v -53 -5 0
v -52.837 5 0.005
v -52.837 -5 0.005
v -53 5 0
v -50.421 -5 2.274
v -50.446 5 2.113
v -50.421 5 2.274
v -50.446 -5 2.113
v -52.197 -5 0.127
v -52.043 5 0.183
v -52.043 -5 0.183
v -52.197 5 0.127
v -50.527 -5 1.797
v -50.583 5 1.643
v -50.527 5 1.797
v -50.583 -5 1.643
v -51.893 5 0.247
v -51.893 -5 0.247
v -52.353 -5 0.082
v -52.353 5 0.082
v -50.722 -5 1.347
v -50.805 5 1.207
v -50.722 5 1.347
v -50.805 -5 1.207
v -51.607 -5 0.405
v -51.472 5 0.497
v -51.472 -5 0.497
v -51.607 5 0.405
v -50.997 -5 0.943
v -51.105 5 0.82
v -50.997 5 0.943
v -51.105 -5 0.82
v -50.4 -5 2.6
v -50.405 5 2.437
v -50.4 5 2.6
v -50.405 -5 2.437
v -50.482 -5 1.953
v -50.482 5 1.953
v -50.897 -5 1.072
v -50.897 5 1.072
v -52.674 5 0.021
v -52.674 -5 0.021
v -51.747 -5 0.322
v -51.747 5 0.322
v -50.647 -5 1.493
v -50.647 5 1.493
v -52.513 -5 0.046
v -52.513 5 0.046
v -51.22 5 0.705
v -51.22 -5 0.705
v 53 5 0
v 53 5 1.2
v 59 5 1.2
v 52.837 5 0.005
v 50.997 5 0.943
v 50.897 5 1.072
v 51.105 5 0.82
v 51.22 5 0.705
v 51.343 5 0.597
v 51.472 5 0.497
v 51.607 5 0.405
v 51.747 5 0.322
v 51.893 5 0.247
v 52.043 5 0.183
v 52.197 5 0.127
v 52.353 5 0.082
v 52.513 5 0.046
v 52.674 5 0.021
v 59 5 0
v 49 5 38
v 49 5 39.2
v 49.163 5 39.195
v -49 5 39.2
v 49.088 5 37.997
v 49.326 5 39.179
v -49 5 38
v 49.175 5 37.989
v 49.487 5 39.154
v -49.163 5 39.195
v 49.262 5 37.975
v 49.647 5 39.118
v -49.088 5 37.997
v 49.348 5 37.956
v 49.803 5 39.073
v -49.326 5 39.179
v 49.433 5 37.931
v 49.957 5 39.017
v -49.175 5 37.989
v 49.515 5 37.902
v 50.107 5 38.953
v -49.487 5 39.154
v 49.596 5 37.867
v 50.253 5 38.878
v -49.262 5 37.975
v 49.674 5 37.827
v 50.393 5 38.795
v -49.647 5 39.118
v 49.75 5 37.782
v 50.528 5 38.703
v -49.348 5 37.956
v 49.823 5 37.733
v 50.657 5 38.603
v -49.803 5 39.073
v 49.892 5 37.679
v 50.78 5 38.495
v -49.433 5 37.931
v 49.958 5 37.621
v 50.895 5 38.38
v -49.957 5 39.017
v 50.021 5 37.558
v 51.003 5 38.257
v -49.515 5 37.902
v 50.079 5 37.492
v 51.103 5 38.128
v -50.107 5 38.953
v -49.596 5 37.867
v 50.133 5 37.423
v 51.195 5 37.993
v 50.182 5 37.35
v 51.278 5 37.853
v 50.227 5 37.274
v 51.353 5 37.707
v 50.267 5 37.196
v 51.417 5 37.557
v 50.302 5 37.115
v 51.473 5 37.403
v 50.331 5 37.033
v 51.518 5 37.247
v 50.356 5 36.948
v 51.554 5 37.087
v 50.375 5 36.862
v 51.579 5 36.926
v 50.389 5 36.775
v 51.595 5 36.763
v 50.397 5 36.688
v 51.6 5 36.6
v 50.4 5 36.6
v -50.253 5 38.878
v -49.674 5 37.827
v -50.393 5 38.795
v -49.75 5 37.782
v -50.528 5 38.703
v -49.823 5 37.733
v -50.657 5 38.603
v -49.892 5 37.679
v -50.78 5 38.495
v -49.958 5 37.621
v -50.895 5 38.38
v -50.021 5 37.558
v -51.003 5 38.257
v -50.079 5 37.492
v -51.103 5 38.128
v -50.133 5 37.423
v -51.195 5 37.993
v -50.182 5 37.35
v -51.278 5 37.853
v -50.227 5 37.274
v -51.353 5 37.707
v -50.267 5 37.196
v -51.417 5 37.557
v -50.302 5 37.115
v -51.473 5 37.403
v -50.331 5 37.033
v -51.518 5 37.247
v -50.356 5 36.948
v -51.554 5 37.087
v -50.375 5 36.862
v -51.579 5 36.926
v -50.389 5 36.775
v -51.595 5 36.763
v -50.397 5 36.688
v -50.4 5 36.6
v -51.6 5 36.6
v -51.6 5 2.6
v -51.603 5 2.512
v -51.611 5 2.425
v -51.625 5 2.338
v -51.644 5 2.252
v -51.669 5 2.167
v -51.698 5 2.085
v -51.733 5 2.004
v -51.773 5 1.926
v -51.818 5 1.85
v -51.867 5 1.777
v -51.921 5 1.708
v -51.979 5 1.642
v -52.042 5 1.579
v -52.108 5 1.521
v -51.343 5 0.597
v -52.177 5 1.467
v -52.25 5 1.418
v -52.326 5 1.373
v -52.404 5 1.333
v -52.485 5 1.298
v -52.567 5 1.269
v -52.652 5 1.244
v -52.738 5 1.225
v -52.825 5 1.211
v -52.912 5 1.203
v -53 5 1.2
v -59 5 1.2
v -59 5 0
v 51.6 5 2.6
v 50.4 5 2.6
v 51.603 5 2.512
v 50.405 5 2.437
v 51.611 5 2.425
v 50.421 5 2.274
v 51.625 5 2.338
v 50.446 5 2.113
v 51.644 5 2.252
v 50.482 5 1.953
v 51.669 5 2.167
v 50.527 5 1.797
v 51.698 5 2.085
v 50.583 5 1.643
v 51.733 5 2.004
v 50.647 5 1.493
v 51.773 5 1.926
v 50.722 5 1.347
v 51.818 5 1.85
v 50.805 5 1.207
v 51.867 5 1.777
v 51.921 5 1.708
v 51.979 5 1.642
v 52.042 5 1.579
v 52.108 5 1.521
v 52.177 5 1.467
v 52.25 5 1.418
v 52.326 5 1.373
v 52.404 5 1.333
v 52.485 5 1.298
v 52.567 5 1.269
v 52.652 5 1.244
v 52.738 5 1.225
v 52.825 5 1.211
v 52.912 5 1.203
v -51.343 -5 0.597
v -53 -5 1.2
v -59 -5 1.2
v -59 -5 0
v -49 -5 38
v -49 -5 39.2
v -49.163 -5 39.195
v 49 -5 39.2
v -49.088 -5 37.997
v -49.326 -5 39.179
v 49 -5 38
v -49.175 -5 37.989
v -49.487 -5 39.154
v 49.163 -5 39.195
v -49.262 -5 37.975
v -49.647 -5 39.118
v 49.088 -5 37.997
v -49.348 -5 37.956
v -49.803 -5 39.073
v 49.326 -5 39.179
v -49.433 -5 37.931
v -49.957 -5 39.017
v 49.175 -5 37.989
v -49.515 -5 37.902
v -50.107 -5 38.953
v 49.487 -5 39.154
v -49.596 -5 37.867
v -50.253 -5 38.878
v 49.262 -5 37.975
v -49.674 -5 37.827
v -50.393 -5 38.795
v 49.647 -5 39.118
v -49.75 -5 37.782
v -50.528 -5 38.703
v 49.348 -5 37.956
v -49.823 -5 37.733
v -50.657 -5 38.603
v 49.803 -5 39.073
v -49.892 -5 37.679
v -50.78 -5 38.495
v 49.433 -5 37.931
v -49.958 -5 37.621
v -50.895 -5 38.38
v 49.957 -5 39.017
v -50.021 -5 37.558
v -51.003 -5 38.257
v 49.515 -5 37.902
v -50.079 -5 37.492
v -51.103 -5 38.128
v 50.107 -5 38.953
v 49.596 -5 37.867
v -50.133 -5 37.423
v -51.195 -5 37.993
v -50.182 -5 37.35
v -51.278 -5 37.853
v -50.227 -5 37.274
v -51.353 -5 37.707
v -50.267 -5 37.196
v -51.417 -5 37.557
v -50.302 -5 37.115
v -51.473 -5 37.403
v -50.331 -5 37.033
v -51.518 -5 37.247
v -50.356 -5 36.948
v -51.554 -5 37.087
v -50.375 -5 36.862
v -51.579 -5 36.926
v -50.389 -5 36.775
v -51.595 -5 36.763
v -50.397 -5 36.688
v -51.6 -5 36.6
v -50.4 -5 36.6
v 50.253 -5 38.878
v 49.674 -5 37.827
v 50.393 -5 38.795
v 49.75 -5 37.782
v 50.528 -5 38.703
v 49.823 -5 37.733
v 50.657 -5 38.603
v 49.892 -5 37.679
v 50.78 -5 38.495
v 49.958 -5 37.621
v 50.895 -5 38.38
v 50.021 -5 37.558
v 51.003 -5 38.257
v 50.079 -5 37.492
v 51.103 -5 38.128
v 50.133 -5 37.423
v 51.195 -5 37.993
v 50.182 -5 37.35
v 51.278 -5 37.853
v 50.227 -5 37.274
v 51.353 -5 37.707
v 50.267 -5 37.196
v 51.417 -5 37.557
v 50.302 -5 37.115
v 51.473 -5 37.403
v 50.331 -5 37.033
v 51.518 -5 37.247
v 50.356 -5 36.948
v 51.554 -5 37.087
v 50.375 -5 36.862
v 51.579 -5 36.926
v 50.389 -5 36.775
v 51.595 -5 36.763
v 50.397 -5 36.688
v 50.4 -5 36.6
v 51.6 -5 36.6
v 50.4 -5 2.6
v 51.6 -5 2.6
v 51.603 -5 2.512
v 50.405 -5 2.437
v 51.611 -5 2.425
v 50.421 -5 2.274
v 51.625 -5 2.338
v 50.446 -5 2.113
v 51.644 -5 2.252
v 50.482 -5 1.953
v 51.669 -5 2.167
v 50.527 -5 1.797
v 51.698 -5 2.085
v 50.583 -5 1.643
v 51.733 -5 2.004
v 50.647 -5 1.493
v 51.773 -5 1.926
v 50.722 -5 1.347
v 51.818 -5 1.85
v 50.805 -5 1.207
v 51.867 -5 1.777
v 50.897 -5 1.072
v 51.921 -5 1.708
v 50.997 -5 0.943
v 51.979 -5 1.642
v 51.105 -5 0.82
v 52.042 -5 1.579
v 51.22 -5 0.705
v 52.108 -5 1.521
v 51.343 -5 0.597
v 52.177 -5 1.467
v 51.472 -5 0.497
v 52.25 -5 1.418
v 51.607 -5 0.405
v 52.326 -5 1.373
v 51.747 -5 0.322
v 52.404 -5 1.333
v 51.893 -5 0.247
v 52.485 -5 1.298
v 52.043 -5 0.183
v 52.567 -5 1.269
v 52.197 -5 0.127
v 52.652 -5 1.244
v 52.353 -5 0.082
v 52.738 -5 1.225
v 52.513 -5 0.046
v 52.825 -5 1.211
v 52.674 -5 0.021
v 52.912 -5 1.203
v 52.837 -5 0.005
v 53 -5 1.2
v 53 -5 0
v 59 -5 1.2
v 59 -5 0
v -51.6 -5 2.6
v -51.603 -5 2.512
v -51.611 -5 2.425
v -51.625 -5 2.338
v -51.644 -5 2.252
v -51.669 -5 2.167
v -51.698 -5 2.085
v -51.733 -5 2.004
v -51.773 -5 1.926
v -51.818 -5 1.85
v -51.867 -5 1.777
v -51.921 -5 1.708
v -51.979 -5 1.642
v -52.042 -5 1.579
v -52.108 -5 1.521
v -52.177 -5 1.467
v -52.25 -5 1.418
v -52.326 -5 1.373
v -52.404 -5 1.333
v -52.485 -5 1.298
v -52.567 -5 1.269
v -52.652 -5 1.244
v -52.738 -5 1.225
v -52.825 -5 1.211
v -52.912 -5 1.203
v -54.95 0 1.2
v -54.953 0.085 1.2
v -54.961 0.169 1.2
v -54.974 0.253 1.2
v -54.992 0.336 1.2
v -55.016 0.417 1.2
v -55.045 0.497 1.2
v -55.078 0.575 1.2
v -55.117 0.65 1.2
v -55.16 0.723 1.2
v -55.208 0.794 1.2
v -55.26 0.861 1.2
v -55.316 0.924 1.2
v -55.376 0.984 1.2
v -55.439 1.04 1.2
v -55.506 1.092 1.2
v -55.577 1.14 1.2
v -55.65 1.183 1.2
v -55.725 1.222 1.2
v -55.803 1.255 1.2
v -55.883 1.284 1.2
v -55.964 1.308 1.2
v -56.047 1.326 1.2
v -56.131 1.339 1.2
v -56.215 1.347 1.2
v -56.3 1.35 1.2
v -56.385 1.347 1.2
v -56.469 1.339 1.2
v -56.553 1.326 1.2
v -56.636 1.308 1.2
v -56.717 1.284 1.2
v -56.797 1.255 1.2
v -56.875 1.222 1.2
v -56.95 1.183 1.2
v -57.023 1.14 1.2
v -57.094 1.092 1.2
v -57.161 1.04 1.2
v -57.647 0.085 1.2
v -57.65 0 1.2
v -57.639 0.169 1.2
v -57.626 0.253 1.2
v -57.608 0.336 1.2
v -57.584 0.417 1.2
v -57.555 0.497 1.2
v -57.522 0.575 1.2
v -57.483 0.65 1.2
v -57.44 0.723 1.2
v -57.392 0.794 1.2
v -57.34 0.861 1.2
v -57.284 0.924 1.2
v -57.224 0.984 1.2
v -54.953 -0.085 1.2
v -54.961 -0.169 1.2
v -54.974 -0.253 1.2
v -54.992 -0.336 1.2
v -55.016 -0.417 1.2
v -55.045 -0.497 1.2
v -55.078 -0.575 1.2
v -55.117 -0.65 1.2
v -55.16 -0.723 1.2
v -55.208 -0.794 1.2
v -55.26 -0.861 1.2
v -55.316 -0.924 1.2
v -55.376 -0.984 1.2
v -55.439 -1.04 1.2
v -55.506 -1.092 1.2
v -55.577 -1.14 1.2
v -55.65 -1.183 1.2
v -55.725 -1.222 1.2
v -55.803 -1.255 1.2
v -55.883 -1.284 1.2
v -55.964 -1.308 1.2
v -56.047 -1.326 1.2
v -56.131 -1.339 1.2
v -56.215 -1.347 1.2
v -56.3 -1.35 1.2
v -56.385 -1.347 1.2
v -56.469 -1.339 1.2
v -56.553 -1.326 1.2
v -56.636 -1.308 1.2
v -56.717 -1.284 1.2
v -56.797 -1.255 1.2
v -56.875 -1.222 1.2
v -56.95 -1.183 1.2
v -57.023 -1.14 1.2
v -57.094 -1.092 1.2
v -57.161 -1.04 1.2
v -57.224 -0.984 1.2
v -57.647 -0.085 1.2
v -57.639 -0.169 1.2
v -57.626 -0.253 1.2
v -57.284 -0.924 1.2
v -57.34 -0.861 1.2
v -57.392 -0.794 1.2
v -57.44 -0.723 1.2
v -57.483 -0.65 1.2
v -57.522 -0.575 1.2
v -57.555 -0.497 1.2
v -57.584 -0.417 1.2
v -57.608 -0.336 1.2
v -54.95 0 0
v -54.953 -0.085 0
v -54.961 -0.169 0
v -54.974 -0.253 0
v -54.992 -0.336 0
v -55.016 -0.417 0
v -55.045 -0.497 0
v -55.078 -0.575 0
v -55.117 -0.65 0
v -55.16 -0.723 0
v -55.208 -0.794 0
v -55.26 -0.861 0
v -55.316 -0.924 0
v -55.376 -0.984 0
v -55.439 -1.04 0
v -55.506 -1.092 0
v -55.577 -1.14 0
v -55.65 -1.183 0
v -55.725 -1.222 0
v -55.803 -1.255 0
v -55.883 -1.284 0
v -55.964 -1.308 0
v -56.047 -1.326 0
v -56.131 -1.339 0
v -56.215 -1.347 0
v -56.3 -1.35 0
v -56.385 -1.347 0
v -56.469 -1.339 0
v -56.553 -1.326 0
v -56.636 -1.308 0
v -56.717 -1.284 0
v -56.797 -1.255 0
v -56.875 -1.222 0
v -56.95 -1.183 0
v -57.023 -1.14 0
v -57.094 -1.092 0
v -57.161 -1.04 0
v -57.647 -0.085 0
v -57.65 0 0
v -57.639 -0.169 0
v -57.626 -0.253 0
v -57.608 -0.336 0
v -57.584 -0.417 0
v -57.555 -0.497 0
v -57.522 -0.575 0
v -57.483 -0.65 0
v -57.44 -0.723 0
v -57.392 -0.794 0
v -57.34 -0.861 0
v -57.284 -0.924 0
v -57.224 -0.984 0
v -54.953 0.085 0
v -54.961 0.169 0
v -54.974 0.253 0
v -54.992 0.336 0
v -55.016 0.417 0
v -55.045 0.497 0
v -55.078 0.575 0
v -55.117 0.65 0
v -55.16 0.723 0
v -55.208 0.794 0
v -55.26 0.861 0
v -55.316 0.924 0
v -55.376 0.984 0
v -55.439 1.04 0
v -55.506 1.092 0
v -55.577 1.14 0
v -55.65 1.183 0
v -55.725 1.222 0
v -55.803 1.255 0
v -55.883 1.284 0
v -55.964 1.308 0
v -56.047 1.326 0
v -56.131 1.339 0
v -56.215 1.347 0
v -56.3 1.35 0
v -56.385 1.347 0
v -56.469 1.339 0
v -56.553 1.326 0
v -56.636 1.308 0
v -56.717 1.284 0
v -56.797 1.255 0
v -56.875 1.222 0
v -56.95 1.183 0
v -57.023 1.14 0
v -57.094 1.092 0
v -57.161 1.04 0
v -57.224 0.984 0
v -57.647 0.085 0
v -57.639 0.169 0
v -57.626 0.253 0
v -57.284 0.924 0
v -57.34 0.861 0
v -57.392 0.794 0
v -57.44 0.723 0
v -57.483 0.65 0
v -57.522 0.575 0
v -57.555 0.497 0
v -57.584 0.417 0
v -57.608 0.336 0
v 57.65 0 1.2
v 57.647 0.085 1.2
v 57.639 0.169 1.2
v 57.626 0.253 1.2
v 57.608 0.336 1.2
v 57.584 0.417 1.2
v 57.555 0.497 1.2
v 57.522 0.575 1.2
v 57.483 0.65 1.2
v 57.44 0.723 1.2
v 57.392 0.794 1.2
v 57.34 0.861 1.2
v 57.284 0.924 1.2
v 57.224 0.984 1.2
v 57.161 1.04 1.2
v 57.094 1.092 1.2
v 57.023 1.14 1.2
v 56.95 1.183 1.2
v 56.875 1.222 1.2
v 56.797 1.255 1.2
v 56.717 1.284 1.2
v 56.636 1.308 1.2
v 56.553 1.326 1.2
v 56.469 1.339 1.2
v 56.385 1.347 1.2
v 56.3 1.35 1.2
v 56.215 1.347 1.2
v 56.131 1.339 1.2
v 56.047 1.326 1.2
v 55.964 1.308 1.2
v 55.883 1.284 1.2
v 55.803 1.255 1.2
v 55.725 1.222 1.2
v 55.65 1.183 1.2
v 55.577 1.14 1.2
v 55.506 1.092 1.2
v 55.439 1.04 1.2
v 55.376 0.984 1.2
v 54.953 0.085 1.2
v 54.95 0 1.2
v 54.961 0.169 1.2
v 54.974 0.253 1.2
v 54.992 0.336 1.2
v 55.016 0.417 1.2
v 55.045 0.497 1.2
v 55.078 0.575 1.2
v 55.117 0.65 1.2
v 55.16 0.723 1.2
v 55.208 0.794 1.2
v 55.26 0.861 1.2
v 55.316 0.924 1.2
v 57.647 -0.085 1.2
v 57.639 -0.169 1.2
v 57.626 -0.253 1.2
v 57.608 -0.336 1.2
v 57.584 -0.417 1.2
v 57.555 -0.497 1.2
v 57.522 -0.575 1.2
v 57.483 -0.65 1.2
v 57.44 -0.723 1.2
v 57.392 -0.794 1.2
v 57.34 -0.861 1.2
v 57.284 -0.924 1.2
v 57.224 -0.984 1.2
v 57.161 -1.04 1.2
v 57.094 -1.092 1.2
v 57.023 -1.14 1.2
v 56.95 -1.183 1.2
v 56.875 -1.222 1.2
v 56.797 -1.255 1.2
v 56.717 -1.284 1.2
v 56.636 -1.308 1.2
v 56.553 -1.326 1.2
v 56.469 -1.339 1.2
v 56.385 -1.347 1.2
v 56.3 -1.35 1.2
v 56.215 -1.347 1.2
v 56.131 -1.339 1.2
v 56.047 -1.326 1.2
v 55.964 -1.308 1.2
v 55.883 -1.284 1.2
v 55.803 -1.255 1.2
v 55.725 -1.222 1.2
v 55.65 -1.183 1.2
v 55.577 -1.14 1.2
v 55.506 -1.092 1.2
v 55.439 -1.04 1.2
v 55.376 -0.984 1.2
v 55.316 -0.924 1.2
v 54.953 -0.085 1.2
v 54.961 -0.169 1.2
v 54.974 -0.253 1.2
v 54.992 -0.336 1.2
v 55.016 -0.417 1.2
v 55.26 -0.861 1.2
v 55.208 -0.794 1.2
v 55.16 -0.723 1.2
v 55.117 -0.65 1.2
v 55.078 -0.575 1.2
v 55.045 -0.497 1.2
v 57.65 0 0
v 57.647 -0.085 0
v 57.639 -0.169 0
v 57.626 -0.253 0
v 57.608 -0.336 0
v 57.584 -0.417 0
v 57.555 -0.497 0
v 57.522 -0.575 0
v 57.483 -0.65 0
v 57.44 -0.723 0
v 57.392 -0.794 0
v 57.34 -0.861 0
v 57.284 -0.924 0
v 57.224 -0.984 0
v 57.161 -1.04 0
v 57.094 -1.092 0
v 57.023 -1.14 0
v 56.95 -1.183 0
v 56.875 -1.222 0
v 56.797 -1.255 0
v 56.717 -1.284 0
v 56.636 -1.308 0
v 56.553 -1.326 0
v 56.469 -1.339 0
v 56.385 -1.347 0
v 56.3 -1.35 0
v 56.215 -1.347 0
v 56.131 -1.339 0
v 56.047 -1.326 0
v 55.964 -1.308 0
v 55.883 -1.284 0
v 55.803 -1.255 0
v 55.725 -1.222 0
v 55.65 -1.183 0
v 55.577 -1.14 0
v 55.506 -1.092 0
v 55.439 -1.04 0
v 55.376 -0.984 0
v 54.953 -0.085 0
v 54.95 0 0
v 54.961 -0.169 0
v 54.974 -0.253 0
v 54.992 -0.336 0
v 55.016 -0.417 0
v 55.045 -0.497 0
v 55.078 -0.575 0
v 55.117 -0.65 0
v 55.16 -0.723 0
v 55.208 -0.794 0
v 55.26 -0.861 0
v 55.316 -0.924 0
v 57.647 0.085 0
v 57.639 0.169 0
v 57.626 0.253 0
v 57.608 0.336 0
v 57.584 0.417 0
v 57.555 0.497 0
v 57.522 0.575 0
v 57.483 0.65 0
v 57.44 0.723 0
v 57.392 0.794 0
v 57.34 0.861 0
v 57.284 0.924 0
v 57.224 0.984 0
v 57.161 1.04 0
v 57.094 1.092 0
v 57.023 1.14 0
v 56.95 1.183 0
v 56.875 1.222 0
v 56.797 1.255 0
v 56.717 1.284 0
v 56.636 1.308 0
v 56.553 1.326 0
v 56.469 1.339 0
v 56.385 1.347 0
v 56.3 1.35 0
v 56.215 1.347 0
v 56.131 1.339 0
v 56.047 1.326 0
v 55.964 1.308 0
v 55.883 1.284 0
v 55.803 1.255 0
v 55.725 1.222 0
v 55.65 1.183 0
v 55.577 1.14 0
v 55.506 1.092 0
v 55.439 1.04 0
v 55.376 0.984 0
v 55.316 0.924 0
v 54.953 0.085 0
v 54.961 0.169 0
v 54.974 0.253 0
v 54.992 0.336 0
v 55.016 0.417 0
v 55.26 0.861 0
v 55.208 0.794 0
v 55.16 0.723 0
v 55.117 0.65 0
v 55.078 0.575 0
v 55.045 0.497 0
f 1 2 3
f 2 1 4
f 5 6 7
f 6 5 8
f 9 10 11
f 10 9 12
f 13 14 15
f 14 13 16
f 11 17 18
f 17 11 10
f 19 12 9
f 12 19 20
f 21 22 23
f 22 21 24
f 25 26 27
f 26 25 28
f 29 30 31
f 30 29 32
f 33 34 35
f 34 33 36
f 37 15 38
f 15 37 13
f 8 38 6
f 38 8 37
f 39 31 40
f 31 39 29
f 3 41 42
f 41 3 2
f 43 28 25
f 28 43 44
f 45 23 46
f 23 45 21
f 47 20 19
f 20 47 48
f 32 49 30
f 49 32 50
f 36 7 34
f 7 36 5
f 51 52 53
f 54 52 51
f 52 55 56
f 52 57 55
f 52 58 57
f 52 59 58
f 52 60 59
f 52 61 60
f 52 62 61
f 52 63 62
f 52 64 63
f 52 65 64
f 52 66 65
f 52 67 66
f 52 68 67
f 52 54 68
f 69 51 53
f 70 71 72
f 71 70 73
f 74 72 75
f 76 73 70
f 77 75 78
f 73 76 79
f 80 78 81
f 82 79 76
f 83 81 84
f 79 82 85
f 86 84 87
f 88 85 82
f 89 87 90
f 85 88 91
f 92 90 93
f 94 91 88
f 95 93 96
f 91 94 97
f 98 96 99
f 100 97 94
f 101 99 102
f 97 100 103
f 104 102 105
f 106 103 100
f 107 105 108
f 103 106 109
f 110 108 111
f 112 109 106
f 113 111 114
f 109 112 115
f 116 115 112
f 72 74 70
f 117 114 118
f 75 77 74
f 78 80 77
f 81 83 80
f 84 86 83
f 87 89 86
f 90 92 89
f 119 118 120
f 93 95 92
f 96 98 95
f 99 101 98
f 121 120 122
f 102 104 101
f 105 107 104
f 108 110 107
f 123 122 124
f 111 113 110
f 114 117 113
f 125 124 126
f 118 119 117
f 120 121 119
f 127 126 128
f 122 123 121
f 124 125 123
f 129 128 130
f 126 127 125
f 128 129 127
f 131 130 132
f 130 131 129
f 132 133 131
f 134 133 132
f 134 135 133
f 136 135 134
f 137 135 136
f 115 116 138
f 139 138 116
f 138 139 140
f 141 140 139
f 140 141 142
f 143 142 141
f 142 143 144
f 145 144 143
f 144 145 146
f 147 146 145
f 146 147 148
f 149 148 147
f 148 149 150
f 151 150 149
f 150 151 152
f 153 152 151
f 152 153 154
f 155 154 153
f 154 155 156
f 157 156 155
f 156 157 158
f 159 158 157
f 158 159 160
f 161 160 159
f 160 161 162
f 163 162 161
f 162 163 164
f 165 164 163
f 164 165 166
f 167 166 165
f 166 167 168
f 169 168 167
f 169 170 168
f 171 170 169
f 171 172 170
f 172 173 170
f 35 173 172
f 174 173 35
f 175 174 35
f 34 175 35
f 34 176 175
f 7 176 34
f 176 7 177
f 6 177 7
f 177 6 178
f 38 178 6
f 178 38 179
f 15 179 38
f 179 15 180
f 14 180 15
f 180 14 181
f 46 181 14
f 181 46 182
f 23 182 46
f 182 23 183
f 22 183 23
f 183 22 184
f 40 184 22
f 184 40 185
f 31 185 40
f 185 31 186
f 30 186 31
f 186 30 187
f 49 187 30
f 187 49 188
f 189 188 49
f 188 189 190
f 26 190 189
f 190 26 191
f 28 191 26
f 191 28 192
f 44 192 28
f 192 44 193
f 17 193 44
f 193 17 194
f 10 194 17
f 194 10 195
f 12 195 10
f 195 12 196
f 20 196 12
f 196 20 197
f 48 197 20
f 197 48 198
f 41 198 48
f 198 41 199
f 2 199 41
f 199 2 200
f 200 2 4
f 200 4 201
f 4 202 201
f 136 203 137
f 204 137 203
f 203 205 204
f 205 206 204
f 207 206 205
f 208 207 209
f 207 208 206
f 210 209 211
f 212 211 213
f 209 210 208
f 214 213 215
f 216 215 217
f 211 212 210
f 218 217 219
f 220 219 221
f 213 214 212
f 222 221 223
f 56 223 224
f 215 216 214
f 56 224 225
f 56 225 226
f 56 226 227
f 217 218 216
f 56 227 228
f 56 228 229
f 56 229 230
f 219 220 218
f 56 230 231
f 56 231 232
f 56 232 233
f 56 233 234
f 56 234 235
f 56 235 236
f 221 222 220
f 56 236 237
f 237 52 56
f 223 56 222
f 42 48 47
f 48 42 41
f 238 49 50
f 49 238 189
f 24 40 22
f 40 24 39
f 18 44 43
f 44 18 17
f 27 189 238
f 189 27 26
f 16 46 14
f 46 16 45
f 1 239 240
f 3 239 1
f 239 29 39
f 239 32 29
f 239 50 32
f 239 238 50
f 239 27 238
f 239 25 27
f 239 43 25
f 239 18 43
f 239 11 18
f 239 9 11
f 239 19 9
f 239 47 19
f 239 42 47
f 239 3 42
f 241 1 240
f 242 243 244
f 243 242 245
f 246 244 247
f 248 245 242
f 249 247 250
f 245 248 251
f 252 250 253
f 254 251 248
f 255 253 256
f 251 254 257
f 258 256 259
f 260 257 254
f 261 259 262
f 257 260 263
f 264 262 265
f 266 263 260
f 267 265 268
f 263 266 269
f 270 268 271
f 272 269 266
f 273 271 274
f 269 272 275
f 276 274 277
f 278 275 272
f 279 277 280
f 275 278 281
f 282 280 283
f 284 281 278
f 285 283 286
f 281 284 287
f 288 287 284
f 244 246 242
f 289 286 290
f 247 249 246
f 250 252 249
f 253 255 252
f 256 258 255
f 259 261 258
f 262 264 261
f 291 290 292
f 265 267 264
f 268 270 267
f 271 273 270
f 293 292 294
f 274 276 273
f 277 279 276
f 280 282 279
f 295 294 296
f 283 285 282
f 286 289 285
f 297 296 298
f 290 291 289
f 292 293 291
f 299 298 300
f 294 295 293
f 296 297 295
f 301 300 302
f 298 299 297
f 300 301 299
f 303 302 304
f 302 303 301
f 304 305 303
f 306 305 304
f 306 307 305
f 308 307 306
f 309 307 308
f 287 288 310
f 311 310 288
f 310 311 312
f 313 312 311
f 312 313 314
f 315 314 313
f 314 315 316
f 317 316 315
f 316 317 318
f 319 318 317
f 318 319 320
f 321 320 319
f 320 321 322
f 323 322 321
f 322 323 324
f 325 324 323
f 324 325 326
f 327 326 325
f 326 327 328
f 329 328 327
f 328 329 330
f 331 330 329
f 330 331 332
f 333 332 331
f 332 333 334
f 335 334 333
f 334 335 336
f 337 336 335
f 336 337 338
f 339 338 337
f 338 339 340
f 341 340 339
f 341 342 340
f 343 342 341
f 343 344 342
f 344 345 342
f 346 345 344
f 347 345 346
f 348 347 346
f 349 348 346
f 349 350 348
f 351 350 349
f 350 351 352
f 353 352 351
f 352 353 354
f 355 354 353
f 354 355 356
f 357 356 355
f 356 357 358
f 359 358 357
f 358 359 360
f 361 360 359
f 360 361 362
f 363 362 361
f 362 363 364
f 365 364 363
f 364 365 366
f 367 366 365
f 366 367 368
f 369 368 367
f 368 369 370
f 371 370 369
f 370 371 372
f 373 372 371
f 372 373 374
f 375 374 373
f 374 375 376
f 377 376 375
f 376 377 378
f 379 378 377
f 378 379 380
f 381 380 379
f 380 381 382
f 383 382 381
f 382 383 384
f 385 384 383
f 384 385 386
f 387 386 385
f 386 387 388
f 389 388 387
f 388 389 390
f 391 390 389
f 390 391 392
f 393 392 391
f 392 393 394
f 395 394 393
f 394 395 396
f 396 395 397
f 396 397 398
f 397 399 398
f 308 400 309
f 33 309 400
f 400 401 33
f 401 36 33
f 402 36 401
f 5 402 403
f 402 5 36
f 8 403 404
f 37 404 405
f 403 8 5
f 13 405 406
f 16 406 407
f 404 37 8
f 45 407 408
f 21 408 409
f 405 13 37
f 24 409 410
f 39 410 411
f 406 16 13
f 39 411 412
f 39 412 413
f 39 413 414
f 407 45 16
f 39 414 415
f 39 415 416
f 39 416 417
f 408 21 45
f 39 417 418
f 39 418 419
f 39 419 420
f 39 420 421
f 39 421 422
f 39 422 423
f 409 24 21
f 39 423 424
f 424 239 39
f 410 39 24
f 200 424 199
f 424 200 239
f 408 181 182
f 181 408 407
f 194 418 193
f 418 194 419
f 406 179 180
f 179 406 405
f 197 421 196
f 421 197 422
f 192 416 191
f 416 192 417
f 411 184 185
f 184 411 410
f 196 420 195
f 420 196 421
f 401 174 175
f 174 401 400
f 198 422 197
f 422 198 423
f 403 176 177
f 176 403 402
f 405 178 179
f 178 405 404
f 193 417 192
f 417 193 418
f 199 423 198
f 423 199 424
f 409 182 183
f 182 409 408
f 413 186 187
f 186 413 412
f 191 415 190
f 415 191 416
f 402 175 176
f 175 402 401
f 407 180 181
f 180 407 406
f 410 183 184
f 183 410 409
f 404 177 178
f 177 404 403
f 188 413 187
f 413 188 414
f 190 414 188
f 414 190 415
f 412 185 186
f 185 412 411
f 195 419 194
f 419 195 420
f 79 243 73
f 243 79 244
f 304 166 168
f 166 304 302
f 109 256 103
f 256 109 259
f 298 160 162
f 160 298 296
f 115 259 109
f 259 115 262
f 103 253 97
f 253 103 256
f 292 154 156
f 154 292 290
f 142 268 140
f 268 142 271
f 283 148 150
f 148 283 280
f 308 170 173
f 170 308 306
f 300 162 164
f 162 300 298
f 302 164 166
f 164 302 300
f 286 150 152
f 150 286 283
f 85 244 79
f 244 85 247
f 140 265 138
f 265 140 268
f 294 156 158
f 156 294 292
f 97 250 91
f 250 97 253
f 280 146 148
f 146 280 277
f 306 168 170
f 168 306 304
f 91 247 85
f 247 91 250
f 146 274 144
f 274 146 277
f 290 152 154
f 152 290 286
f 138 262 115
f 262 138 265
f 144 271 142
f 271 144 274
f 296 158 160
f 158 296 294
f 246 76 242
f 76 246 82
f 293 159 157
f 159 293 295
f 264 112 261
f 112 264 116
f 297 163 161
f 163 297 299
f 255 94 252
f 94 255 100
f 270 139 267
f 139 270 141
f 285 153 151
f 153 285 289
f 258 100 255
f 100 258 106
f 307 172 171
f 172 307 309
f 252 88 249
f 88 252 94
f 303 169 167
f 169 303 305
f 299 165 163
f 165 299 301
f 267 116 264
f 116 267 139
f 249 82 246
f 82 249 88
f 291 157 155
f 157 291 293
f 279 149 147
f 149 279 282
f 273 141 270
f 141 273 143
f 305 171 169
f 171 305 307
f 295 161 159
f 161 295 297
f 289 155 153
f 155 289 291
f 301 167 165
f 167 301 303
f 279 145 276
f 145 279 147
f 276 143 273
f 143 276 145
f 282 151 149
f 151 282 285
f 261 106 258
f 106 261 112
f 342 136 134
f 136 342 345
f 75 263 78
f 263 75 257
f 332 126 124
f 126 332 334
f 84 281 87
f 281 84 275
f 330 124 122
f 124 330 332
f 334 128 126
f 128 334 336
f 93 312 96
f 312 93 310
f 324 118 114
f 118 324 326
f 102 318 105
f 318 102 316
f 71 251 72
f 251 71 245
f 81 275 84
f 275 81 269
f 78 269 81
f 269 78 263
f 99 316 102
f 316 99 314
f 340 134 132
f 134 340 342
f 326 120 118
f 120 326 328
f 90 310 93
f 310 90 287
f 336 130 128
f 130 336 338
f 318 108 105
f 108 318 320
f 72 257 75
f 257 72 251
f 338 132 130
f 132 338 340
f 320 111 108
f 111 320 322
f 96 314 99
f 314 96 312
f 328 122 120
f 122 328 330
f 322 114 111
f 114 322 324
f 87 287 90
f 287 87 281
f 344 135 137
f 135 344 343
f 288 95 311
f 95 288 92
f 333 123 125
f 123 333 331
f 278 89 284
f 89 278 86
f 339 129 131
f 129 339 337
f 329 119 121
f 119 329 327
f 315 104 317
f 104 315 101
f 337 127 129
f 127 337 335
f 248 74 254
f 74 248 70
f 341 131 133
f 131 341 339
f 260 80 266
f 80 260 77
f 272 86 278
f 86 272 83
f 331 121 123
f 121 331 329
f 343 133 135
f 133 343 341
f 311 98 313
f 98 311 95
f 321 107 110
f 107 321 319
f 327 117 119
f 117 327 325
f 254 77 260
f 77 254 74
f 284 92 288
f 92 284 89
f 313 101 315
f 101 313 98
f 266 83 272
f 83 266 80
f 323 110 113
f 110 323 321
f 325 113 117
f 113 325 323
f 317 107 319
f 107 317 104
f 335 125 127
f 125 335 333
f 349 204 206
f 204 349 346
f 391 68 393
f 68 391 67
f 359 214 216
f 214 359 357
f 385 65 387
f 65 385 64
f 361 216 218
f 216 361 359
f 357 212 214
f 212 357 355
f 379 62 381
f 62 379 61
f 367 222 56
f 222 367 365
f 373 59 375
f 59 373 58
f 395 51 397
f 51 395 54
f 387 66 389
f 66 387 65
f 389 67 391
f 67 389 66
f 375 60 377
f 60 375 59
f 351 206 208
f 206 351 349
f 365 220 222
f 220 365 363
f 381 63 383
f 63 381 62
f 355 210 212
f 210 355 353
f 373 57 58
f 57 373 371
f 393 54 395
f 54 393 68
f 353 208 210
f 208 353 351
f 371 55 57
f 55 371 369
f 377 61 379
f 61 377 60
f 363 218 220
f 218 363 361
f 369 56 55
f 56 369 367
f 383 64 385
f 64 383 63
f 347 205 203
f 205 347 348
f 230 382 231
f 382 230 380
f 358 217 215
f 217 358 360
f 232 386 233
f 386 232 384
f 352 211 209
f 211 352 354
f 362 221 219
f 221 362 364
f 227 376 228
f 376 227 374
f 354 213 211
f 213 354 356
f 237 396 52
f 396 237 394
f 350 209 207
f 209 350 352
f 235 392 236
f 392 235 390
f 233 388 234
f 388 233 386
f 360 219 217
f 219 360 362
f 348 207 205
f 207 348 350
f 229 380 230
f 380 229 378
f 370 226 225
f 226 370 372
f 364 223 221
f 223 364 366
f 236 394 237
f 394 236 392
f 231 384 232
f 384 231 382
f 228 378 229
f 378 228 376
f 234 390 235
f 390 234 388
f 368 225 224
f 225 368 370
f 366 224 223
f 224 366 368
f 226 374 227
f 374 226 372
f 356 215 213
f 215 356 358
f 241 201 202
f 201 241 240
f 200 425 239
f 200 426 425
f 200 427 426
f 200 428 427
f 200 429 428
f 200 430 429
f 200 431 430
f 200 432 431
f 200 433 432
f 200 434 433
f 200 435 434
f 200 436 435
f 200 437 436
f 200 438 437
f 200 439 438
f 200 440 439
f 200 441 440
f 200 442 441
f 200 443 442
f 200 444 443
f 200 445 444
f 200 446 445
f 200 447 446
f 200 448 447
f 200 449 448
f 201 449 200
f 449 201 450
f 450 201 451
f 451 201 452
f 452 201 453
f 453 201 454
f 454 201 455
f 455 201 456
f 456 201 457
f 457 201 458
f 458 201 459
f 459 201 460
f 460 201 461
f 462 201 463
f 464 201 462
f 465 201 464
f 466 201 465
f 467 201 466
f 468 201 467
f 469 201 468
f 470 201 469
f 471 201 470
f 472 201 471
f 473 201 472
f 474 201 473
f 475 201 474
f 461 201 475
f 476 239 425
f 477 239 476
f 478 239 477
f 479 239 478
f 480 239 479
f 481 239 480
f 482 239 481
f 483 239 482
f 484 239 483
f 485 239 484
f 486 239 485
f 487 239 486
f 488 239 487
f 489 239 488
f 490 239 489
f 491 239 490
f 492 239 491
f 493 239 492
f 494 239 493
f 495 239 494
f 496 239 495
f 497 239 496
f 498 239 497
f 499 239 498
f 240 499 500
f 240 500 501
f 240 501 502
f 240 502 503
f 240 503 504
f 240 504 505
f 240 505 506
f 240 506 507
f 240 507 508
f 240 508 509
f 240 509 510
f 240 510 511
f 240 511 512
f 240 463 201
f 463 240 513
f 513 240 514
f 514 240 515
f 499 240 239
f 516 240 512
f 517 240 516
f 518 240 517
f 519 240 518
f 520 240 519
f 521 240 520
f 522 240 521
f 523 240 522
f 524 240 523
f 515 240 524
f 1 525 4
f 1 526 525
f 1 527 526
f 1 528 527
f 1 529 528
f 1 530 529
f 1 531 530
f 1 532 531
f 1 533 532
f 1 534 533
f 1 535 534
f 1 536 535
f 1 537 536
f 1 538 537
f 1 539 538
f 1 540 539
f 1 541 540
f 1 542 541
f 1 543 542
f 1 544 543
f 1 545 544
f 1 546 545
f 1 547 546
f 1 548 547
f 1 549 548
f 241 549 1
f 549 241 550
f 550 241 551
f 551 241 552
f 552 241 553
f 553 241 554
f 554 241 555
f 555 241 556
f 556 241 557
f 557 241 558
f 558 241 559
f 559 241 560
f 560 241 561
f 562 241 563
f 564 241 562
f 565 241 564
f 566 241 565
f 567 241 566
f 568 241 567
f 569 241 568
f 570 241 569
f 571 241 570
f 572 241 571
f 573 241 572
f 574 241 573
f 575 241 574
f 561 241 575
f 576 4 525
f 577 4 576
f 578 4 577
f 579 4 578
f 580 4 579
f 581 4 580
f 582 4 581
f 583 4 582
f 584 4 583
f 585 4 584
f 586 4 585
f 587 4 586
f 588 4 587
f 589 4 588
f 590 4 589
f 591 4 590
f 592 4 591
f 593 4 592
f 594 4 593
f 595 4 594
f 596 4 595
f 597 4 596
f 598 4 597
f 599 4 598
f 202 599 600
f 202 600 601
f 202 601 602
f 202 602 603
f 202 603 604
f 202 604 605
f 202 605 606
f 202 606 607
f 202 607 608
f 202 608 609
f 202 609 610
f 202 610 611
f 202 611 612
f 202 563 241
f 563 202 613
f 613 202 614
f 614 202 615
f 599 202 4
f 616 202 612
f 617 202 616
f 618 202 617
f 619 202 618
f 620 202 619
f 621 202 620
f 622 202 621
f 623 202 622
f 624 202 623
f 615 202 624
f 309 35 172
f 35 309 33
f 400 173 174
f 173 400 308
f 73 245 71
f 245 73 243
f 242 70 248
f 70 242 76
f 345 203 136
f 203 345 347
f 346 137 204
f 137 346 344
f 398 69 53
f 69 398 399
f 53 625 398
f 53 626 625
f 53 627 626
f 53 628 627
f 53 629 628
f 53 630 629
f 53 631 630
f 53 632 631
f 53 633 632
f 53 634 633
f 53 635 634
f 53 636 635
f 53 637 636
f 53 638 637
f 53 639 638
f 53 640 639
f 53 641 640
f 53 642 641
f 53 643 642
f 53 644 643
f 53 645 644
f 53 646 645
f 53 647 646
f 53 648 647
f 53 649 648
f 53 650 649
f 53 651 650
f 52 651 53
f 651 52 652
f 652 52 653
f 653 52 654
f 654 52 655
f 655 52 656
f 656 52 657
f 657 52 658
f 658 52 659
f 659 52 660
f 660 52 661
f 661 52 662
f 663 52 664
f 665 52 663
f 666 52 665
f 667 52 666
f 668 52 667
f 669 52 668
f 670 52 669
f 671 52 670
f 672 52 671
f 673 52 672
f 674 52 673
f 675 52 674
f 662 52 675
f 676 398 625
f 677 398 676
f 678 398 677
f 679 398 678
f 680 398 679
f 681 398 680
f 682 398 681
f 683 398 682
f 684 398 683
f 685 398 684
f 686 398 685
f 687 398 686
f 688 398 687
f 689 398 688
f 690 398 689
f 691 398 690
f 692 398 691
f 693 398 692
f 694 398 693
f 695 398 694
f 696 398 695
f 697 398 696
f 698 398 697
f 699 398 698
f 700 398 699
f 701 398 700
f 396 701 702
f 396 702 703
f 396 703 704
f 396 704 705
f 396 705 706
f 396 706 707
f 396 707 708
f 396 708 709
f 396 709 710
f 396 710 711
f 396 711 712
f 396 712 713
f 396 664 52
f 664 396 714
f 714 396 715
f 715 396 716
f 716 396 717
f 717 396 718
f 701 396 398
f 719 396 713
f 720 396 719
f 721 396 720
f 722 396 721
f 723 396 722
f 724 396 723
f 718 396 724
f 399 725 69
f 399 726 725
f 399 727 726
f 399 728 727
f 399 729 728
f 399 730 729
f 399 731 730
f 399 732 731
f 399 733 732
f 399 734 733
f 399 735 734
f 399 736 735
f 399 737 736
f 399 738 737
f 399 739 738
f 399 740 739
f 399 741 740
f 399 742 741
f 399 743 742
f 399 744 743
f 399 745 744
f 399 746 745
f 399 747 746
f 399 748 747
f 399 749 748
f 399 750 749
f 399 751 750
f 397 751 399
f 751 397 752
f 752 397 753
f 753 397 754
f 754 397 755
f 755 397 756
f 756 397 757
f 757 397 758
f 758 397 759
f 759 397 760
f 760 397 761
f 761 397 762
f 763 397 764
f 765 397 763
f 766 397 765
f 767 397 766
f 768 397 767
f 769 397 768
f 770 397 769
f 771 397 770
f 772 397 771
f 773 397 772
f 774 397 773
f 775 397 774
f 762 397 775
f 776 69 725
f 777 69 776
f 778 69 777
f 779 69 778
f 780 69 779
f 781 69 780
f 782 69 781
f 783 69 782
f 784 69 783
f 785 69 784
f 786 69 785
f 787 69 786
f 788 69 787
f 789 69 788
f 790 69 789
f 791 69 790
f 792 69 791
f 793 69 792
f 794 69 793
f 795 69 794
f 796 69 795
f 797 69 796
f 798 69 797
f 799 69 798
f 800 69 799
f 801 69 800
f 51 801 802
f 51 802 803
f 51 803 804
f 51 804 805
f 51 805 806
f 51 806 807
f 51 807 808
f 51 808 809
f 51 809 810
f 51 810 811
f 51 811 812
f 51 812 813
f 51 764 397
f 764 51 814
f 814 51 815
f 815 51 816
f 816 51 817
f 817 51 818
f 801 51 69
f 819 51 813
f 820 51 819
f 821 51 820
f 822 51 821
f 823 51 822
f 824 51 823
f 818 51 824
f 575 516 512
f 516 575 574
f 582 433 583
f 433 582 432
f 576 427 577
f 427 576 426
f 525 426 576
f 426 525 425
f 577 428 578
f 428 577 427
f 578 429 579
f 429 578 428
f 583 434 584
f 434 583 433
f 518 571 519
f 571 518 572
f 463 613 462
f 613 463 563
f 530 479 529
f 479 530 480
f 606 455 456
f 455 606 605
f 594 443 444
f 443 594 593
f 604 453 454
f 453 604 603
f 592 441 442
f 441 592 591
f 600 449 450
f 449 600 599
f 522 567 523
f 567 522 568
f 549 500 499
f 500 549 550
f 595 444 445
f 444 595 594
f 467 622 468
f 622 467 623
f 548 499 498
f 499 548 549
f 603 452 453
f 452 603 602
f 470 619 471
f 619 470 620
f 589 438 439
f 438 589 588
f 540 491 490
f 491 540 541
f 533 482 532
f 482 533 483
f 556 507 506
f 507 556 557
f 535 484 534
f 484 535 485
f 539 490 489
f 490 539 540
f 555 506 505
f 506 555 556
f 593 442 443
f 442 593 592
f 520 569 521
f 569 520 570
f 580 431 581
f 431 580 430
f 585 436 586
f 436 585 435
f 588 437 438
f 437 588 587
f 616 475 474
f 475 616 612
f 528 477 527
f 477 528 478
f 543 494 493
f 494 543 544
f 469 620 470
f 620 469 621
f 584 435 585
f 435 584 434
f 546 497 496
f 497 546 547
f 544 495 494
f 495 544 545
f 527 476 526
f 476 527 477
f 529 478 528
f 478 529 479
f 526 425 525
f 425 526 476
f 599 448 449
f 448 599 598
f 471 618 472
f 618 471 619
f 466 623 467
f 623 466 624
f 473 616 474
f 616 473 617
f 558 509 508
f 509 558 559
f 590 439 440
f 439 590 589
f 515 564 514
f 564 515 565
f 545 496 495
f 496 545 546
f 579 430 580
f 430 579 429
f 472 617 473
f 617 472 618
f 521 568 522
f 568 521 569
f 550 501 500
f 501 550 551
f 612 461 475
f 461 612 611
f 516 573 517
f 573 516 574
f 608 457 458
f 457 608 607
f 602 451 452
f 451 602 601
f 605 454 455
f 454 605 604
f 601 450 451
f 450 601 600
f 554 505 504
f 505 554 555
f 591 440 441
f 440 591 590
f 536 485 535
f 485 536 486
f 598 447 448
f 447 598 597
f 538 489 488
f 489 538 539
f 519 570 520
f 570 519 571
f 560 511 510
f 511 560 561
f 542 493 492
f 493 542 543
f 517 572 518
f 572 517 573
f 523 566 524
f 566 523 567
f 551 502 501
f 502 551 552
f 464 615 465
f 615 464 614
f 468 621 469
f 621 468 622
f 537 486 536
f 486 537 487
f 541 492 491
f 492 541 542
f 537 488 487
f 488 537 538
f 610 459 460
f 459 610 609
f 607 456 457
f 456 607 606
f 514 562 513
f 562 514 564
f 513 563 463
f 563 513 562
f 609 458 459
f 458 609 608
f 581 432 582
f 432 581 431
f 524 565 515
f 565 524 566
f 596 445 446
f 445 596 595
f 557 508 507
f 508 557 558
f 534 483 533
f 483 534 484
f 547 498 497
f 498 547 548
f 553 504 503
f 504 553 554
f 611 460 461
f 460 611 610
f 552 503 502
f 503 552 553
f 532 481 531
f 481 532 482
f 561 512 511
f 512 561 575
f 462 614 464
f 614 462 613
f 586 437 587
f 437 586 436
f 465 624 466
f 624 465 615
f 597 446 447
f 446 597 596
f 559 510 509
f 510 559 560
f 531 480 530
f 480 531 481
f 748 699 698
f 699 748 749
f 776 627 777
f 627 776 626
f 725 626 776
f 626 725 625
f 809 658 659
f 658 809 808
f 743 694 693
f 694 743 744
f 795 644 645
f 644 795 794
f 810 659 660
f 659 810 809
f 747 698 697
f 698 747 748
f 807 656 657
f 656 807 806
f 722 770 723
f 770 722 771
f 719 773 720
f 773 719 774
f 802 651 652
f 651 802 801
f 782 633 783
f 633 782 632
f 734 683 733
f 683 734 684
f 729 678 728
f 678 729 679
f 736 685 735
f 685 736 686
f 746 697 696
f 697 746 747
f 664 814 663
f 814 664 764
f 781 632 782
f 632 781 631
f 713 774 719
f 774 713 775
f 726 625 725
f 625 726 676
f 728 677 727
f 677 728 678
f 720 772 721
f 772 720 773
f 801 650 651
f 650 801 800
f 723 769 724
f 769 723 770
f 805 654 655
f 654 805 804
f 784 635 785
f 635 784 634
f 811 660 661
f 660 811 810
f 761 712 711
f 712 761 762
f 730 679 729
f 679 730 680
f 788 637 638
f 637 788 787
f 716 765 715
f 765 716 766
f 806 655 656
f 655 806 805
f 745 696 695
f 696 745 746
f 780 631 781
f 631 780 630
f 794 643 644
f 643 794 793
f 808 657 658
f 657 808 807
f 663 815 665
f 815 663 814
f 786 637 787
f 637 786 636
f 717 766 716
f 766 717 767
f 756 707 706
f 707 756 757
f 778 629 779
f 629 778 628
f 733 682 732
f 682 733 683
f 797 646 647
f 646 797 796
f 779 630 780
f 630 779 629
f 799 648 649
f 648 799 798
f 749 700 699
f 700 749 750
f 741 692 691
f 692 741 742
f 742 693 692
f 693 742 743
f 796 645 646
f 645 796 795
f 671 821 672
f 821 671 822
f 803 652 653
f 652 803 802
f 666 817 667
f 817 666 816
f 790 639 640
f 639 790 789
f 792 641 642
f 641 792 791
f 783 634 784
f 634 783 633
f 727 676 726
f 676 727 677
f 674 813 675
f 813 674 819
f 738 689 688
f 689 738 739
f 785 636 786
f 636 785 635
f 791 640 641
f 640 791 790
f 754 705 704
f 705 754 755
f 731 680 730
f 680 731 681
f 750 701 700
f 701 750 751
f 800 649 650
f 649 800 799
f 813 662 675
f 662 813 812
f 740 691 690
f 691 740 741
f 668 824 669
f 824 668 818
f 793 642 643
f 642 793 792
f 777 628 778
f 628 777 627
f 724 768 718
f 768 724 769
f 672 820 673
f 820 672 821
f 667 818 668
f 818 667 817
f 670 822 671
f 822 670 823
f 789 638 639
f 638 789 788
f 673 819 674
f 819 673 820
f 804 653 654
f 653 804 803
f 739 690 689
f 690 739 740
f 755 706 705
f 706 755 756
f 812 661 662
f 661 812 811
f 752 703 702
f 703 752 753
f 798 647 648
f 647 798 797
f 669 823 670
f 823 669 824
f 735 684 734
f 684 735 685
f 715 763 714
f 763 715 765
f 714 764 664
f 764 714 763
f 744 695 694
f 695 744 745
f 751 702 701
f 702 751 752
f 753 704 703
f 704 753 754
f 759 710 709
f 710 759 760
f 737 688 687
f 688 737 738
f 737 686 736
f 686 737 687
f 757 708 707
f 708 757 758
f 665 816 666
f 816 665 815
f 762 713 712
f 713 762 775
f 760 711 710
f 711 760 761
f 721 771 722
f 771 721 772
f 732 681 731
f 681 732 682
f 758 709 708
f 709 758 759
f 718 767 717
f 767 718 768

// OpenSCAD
$fn=100;
// This scad designs the bracket for fixing R1000 modules on a R1000A and R1000A-mini boards

// global variables

tsheet = 1.2;       // sheet metal thickness
tbracket = 10;      // bracket thickness

//wbracket = 152;     // bracket width (R1000A)
wbracket = 102;     // bracket width (R1000A-10)


hbracket = 38;      // bracket height
rbend = 2;          // sheet metal bend radius
dscrew = 2.7;       // mounting screws diameter

lscrewl = 2.7;      // distance between left base edge and screw hole center
lscrewr = 2.7;      // distance between right base edge and screw hole center

lbasel = 8;         // left base length
lbaser = 8;         // right base length



difference() {
    // main body
    translate ([-wbracket/2,0,tsheet/2]) rotate ([90,0,0]) translate ([0,0,-tbracket/2]) main_body();
    // mounting screw holes
    translate ([-wbracket/2-lbasel+lscrewl,0,0]) cylinder (d=dscrew, h=1000, center=true);
    translate ([wbracket/2+lbaser-lscrewr,0,0]) cylinder (d=dscrew, h=1000, center=true);
}

module main_body() {
    // left base plate
    translate ([-1*lbasel,tsheet/-2,0]) cube([lbasel-rbend,tsheet,tbracket]);
    // left bottom bend elbow
    translate ([-1*rbend,rbend,0]) rotate ([0,0,-90]) difference() {
        pie_slice_3D(rbend+tsheet/2,0,90,tbracket);
        pie_slice_3D(rbend-tsheet/2,0,90,tbracket);
    }
    //left side plate
    translate ([tsheet/-2,rbend,0]) cube([tsheet,hbracket-2*rbend,tbracket]);
    // left top bend elbow
    translate ([rbend,hbracket-rbend,0]) rotate ([0,0,90]) difference() {
        pie_slice_3D(rbend+tsheet/2,0,90,tbracket);
        pie_slice_3D(rbend-tsheet/2,0,90,tbracket);
    }
    // top plate
    translate ([rbend,hbracket-tsheet/2,0]) cube([wbracket-2*rbend,tsheet,tbracket]);
    // right top bend elbow
    translate ([wbracket-rbend,hbracket-rbend,0]) rotate ([0,0,0]) difference() {
        pie_slice_3D(rbend+tsheet/2,0,90,tbracket);
        pie_slice_3D(rbend-tsheet/2,0,90,tbracket);
    }
    // right side plate
    translate ([wbracket-tsheet/2,rbend,0]) cube([tsheet,hbracket-2*rbend,tbracket]);
    // right bottom bend elbow
    translate ([wbracket+rbend,rbend,0]) rotate ([0,0,180]) difference() {
        pie_slice_3D(rbend+tsheet/2,0,90,tbracket);
        pie_slice_3D(rbend-tsheet/2,0,90,tbracket);
    }
    // right base plate
    translate ([wbracket+rbend,tsheet/-2,0]) cube([lbaser-rbend,tsheet,tbracket]);
}

module pie_slice_2D(r, start_angle, end_angle) {
    // this draws a 2D slice
    // taken from http://forum.openscad.org/Creating-pie-pizza-slice-shape-need-a-dynamic-length-array-td3148.html
    R = r * sqrt(2) + 1;
    a0 = (4 * start_angle + 0 * end_angle) / 4;
    a1 = (3 * start_angle + 1 * end_angle) / 4;
    a2 = (2 * start_angle + 2 * end_angle) / 4;
    a3 = (1 * start_angle + 3 * end_angle) / 4;
    a4 = (0 * start_angle + 4 * end_angle) / 4;
    if(end_angle > start_angle)
        intersection() {
        circle(r);
        polygon([
            [0,0],
            [R * cos(a0), R * sin(a0)],
            [R * cos(a1), R * sin(a1)],
            [R * cos(a2), R * sin(a2)],
            [R * cos(a3), R * sin(a3)],
            [R * cos(a4), R * sin(a4)],
            [0,0]
       ]);
    }
}
module pie_slice_3D(r, start_angle, end_angle, h) {
    // this extrudes a 2D slice linearly
    linear_extrude(height=h) pie_slice_2D(r, start_angle, end_angle);
}
